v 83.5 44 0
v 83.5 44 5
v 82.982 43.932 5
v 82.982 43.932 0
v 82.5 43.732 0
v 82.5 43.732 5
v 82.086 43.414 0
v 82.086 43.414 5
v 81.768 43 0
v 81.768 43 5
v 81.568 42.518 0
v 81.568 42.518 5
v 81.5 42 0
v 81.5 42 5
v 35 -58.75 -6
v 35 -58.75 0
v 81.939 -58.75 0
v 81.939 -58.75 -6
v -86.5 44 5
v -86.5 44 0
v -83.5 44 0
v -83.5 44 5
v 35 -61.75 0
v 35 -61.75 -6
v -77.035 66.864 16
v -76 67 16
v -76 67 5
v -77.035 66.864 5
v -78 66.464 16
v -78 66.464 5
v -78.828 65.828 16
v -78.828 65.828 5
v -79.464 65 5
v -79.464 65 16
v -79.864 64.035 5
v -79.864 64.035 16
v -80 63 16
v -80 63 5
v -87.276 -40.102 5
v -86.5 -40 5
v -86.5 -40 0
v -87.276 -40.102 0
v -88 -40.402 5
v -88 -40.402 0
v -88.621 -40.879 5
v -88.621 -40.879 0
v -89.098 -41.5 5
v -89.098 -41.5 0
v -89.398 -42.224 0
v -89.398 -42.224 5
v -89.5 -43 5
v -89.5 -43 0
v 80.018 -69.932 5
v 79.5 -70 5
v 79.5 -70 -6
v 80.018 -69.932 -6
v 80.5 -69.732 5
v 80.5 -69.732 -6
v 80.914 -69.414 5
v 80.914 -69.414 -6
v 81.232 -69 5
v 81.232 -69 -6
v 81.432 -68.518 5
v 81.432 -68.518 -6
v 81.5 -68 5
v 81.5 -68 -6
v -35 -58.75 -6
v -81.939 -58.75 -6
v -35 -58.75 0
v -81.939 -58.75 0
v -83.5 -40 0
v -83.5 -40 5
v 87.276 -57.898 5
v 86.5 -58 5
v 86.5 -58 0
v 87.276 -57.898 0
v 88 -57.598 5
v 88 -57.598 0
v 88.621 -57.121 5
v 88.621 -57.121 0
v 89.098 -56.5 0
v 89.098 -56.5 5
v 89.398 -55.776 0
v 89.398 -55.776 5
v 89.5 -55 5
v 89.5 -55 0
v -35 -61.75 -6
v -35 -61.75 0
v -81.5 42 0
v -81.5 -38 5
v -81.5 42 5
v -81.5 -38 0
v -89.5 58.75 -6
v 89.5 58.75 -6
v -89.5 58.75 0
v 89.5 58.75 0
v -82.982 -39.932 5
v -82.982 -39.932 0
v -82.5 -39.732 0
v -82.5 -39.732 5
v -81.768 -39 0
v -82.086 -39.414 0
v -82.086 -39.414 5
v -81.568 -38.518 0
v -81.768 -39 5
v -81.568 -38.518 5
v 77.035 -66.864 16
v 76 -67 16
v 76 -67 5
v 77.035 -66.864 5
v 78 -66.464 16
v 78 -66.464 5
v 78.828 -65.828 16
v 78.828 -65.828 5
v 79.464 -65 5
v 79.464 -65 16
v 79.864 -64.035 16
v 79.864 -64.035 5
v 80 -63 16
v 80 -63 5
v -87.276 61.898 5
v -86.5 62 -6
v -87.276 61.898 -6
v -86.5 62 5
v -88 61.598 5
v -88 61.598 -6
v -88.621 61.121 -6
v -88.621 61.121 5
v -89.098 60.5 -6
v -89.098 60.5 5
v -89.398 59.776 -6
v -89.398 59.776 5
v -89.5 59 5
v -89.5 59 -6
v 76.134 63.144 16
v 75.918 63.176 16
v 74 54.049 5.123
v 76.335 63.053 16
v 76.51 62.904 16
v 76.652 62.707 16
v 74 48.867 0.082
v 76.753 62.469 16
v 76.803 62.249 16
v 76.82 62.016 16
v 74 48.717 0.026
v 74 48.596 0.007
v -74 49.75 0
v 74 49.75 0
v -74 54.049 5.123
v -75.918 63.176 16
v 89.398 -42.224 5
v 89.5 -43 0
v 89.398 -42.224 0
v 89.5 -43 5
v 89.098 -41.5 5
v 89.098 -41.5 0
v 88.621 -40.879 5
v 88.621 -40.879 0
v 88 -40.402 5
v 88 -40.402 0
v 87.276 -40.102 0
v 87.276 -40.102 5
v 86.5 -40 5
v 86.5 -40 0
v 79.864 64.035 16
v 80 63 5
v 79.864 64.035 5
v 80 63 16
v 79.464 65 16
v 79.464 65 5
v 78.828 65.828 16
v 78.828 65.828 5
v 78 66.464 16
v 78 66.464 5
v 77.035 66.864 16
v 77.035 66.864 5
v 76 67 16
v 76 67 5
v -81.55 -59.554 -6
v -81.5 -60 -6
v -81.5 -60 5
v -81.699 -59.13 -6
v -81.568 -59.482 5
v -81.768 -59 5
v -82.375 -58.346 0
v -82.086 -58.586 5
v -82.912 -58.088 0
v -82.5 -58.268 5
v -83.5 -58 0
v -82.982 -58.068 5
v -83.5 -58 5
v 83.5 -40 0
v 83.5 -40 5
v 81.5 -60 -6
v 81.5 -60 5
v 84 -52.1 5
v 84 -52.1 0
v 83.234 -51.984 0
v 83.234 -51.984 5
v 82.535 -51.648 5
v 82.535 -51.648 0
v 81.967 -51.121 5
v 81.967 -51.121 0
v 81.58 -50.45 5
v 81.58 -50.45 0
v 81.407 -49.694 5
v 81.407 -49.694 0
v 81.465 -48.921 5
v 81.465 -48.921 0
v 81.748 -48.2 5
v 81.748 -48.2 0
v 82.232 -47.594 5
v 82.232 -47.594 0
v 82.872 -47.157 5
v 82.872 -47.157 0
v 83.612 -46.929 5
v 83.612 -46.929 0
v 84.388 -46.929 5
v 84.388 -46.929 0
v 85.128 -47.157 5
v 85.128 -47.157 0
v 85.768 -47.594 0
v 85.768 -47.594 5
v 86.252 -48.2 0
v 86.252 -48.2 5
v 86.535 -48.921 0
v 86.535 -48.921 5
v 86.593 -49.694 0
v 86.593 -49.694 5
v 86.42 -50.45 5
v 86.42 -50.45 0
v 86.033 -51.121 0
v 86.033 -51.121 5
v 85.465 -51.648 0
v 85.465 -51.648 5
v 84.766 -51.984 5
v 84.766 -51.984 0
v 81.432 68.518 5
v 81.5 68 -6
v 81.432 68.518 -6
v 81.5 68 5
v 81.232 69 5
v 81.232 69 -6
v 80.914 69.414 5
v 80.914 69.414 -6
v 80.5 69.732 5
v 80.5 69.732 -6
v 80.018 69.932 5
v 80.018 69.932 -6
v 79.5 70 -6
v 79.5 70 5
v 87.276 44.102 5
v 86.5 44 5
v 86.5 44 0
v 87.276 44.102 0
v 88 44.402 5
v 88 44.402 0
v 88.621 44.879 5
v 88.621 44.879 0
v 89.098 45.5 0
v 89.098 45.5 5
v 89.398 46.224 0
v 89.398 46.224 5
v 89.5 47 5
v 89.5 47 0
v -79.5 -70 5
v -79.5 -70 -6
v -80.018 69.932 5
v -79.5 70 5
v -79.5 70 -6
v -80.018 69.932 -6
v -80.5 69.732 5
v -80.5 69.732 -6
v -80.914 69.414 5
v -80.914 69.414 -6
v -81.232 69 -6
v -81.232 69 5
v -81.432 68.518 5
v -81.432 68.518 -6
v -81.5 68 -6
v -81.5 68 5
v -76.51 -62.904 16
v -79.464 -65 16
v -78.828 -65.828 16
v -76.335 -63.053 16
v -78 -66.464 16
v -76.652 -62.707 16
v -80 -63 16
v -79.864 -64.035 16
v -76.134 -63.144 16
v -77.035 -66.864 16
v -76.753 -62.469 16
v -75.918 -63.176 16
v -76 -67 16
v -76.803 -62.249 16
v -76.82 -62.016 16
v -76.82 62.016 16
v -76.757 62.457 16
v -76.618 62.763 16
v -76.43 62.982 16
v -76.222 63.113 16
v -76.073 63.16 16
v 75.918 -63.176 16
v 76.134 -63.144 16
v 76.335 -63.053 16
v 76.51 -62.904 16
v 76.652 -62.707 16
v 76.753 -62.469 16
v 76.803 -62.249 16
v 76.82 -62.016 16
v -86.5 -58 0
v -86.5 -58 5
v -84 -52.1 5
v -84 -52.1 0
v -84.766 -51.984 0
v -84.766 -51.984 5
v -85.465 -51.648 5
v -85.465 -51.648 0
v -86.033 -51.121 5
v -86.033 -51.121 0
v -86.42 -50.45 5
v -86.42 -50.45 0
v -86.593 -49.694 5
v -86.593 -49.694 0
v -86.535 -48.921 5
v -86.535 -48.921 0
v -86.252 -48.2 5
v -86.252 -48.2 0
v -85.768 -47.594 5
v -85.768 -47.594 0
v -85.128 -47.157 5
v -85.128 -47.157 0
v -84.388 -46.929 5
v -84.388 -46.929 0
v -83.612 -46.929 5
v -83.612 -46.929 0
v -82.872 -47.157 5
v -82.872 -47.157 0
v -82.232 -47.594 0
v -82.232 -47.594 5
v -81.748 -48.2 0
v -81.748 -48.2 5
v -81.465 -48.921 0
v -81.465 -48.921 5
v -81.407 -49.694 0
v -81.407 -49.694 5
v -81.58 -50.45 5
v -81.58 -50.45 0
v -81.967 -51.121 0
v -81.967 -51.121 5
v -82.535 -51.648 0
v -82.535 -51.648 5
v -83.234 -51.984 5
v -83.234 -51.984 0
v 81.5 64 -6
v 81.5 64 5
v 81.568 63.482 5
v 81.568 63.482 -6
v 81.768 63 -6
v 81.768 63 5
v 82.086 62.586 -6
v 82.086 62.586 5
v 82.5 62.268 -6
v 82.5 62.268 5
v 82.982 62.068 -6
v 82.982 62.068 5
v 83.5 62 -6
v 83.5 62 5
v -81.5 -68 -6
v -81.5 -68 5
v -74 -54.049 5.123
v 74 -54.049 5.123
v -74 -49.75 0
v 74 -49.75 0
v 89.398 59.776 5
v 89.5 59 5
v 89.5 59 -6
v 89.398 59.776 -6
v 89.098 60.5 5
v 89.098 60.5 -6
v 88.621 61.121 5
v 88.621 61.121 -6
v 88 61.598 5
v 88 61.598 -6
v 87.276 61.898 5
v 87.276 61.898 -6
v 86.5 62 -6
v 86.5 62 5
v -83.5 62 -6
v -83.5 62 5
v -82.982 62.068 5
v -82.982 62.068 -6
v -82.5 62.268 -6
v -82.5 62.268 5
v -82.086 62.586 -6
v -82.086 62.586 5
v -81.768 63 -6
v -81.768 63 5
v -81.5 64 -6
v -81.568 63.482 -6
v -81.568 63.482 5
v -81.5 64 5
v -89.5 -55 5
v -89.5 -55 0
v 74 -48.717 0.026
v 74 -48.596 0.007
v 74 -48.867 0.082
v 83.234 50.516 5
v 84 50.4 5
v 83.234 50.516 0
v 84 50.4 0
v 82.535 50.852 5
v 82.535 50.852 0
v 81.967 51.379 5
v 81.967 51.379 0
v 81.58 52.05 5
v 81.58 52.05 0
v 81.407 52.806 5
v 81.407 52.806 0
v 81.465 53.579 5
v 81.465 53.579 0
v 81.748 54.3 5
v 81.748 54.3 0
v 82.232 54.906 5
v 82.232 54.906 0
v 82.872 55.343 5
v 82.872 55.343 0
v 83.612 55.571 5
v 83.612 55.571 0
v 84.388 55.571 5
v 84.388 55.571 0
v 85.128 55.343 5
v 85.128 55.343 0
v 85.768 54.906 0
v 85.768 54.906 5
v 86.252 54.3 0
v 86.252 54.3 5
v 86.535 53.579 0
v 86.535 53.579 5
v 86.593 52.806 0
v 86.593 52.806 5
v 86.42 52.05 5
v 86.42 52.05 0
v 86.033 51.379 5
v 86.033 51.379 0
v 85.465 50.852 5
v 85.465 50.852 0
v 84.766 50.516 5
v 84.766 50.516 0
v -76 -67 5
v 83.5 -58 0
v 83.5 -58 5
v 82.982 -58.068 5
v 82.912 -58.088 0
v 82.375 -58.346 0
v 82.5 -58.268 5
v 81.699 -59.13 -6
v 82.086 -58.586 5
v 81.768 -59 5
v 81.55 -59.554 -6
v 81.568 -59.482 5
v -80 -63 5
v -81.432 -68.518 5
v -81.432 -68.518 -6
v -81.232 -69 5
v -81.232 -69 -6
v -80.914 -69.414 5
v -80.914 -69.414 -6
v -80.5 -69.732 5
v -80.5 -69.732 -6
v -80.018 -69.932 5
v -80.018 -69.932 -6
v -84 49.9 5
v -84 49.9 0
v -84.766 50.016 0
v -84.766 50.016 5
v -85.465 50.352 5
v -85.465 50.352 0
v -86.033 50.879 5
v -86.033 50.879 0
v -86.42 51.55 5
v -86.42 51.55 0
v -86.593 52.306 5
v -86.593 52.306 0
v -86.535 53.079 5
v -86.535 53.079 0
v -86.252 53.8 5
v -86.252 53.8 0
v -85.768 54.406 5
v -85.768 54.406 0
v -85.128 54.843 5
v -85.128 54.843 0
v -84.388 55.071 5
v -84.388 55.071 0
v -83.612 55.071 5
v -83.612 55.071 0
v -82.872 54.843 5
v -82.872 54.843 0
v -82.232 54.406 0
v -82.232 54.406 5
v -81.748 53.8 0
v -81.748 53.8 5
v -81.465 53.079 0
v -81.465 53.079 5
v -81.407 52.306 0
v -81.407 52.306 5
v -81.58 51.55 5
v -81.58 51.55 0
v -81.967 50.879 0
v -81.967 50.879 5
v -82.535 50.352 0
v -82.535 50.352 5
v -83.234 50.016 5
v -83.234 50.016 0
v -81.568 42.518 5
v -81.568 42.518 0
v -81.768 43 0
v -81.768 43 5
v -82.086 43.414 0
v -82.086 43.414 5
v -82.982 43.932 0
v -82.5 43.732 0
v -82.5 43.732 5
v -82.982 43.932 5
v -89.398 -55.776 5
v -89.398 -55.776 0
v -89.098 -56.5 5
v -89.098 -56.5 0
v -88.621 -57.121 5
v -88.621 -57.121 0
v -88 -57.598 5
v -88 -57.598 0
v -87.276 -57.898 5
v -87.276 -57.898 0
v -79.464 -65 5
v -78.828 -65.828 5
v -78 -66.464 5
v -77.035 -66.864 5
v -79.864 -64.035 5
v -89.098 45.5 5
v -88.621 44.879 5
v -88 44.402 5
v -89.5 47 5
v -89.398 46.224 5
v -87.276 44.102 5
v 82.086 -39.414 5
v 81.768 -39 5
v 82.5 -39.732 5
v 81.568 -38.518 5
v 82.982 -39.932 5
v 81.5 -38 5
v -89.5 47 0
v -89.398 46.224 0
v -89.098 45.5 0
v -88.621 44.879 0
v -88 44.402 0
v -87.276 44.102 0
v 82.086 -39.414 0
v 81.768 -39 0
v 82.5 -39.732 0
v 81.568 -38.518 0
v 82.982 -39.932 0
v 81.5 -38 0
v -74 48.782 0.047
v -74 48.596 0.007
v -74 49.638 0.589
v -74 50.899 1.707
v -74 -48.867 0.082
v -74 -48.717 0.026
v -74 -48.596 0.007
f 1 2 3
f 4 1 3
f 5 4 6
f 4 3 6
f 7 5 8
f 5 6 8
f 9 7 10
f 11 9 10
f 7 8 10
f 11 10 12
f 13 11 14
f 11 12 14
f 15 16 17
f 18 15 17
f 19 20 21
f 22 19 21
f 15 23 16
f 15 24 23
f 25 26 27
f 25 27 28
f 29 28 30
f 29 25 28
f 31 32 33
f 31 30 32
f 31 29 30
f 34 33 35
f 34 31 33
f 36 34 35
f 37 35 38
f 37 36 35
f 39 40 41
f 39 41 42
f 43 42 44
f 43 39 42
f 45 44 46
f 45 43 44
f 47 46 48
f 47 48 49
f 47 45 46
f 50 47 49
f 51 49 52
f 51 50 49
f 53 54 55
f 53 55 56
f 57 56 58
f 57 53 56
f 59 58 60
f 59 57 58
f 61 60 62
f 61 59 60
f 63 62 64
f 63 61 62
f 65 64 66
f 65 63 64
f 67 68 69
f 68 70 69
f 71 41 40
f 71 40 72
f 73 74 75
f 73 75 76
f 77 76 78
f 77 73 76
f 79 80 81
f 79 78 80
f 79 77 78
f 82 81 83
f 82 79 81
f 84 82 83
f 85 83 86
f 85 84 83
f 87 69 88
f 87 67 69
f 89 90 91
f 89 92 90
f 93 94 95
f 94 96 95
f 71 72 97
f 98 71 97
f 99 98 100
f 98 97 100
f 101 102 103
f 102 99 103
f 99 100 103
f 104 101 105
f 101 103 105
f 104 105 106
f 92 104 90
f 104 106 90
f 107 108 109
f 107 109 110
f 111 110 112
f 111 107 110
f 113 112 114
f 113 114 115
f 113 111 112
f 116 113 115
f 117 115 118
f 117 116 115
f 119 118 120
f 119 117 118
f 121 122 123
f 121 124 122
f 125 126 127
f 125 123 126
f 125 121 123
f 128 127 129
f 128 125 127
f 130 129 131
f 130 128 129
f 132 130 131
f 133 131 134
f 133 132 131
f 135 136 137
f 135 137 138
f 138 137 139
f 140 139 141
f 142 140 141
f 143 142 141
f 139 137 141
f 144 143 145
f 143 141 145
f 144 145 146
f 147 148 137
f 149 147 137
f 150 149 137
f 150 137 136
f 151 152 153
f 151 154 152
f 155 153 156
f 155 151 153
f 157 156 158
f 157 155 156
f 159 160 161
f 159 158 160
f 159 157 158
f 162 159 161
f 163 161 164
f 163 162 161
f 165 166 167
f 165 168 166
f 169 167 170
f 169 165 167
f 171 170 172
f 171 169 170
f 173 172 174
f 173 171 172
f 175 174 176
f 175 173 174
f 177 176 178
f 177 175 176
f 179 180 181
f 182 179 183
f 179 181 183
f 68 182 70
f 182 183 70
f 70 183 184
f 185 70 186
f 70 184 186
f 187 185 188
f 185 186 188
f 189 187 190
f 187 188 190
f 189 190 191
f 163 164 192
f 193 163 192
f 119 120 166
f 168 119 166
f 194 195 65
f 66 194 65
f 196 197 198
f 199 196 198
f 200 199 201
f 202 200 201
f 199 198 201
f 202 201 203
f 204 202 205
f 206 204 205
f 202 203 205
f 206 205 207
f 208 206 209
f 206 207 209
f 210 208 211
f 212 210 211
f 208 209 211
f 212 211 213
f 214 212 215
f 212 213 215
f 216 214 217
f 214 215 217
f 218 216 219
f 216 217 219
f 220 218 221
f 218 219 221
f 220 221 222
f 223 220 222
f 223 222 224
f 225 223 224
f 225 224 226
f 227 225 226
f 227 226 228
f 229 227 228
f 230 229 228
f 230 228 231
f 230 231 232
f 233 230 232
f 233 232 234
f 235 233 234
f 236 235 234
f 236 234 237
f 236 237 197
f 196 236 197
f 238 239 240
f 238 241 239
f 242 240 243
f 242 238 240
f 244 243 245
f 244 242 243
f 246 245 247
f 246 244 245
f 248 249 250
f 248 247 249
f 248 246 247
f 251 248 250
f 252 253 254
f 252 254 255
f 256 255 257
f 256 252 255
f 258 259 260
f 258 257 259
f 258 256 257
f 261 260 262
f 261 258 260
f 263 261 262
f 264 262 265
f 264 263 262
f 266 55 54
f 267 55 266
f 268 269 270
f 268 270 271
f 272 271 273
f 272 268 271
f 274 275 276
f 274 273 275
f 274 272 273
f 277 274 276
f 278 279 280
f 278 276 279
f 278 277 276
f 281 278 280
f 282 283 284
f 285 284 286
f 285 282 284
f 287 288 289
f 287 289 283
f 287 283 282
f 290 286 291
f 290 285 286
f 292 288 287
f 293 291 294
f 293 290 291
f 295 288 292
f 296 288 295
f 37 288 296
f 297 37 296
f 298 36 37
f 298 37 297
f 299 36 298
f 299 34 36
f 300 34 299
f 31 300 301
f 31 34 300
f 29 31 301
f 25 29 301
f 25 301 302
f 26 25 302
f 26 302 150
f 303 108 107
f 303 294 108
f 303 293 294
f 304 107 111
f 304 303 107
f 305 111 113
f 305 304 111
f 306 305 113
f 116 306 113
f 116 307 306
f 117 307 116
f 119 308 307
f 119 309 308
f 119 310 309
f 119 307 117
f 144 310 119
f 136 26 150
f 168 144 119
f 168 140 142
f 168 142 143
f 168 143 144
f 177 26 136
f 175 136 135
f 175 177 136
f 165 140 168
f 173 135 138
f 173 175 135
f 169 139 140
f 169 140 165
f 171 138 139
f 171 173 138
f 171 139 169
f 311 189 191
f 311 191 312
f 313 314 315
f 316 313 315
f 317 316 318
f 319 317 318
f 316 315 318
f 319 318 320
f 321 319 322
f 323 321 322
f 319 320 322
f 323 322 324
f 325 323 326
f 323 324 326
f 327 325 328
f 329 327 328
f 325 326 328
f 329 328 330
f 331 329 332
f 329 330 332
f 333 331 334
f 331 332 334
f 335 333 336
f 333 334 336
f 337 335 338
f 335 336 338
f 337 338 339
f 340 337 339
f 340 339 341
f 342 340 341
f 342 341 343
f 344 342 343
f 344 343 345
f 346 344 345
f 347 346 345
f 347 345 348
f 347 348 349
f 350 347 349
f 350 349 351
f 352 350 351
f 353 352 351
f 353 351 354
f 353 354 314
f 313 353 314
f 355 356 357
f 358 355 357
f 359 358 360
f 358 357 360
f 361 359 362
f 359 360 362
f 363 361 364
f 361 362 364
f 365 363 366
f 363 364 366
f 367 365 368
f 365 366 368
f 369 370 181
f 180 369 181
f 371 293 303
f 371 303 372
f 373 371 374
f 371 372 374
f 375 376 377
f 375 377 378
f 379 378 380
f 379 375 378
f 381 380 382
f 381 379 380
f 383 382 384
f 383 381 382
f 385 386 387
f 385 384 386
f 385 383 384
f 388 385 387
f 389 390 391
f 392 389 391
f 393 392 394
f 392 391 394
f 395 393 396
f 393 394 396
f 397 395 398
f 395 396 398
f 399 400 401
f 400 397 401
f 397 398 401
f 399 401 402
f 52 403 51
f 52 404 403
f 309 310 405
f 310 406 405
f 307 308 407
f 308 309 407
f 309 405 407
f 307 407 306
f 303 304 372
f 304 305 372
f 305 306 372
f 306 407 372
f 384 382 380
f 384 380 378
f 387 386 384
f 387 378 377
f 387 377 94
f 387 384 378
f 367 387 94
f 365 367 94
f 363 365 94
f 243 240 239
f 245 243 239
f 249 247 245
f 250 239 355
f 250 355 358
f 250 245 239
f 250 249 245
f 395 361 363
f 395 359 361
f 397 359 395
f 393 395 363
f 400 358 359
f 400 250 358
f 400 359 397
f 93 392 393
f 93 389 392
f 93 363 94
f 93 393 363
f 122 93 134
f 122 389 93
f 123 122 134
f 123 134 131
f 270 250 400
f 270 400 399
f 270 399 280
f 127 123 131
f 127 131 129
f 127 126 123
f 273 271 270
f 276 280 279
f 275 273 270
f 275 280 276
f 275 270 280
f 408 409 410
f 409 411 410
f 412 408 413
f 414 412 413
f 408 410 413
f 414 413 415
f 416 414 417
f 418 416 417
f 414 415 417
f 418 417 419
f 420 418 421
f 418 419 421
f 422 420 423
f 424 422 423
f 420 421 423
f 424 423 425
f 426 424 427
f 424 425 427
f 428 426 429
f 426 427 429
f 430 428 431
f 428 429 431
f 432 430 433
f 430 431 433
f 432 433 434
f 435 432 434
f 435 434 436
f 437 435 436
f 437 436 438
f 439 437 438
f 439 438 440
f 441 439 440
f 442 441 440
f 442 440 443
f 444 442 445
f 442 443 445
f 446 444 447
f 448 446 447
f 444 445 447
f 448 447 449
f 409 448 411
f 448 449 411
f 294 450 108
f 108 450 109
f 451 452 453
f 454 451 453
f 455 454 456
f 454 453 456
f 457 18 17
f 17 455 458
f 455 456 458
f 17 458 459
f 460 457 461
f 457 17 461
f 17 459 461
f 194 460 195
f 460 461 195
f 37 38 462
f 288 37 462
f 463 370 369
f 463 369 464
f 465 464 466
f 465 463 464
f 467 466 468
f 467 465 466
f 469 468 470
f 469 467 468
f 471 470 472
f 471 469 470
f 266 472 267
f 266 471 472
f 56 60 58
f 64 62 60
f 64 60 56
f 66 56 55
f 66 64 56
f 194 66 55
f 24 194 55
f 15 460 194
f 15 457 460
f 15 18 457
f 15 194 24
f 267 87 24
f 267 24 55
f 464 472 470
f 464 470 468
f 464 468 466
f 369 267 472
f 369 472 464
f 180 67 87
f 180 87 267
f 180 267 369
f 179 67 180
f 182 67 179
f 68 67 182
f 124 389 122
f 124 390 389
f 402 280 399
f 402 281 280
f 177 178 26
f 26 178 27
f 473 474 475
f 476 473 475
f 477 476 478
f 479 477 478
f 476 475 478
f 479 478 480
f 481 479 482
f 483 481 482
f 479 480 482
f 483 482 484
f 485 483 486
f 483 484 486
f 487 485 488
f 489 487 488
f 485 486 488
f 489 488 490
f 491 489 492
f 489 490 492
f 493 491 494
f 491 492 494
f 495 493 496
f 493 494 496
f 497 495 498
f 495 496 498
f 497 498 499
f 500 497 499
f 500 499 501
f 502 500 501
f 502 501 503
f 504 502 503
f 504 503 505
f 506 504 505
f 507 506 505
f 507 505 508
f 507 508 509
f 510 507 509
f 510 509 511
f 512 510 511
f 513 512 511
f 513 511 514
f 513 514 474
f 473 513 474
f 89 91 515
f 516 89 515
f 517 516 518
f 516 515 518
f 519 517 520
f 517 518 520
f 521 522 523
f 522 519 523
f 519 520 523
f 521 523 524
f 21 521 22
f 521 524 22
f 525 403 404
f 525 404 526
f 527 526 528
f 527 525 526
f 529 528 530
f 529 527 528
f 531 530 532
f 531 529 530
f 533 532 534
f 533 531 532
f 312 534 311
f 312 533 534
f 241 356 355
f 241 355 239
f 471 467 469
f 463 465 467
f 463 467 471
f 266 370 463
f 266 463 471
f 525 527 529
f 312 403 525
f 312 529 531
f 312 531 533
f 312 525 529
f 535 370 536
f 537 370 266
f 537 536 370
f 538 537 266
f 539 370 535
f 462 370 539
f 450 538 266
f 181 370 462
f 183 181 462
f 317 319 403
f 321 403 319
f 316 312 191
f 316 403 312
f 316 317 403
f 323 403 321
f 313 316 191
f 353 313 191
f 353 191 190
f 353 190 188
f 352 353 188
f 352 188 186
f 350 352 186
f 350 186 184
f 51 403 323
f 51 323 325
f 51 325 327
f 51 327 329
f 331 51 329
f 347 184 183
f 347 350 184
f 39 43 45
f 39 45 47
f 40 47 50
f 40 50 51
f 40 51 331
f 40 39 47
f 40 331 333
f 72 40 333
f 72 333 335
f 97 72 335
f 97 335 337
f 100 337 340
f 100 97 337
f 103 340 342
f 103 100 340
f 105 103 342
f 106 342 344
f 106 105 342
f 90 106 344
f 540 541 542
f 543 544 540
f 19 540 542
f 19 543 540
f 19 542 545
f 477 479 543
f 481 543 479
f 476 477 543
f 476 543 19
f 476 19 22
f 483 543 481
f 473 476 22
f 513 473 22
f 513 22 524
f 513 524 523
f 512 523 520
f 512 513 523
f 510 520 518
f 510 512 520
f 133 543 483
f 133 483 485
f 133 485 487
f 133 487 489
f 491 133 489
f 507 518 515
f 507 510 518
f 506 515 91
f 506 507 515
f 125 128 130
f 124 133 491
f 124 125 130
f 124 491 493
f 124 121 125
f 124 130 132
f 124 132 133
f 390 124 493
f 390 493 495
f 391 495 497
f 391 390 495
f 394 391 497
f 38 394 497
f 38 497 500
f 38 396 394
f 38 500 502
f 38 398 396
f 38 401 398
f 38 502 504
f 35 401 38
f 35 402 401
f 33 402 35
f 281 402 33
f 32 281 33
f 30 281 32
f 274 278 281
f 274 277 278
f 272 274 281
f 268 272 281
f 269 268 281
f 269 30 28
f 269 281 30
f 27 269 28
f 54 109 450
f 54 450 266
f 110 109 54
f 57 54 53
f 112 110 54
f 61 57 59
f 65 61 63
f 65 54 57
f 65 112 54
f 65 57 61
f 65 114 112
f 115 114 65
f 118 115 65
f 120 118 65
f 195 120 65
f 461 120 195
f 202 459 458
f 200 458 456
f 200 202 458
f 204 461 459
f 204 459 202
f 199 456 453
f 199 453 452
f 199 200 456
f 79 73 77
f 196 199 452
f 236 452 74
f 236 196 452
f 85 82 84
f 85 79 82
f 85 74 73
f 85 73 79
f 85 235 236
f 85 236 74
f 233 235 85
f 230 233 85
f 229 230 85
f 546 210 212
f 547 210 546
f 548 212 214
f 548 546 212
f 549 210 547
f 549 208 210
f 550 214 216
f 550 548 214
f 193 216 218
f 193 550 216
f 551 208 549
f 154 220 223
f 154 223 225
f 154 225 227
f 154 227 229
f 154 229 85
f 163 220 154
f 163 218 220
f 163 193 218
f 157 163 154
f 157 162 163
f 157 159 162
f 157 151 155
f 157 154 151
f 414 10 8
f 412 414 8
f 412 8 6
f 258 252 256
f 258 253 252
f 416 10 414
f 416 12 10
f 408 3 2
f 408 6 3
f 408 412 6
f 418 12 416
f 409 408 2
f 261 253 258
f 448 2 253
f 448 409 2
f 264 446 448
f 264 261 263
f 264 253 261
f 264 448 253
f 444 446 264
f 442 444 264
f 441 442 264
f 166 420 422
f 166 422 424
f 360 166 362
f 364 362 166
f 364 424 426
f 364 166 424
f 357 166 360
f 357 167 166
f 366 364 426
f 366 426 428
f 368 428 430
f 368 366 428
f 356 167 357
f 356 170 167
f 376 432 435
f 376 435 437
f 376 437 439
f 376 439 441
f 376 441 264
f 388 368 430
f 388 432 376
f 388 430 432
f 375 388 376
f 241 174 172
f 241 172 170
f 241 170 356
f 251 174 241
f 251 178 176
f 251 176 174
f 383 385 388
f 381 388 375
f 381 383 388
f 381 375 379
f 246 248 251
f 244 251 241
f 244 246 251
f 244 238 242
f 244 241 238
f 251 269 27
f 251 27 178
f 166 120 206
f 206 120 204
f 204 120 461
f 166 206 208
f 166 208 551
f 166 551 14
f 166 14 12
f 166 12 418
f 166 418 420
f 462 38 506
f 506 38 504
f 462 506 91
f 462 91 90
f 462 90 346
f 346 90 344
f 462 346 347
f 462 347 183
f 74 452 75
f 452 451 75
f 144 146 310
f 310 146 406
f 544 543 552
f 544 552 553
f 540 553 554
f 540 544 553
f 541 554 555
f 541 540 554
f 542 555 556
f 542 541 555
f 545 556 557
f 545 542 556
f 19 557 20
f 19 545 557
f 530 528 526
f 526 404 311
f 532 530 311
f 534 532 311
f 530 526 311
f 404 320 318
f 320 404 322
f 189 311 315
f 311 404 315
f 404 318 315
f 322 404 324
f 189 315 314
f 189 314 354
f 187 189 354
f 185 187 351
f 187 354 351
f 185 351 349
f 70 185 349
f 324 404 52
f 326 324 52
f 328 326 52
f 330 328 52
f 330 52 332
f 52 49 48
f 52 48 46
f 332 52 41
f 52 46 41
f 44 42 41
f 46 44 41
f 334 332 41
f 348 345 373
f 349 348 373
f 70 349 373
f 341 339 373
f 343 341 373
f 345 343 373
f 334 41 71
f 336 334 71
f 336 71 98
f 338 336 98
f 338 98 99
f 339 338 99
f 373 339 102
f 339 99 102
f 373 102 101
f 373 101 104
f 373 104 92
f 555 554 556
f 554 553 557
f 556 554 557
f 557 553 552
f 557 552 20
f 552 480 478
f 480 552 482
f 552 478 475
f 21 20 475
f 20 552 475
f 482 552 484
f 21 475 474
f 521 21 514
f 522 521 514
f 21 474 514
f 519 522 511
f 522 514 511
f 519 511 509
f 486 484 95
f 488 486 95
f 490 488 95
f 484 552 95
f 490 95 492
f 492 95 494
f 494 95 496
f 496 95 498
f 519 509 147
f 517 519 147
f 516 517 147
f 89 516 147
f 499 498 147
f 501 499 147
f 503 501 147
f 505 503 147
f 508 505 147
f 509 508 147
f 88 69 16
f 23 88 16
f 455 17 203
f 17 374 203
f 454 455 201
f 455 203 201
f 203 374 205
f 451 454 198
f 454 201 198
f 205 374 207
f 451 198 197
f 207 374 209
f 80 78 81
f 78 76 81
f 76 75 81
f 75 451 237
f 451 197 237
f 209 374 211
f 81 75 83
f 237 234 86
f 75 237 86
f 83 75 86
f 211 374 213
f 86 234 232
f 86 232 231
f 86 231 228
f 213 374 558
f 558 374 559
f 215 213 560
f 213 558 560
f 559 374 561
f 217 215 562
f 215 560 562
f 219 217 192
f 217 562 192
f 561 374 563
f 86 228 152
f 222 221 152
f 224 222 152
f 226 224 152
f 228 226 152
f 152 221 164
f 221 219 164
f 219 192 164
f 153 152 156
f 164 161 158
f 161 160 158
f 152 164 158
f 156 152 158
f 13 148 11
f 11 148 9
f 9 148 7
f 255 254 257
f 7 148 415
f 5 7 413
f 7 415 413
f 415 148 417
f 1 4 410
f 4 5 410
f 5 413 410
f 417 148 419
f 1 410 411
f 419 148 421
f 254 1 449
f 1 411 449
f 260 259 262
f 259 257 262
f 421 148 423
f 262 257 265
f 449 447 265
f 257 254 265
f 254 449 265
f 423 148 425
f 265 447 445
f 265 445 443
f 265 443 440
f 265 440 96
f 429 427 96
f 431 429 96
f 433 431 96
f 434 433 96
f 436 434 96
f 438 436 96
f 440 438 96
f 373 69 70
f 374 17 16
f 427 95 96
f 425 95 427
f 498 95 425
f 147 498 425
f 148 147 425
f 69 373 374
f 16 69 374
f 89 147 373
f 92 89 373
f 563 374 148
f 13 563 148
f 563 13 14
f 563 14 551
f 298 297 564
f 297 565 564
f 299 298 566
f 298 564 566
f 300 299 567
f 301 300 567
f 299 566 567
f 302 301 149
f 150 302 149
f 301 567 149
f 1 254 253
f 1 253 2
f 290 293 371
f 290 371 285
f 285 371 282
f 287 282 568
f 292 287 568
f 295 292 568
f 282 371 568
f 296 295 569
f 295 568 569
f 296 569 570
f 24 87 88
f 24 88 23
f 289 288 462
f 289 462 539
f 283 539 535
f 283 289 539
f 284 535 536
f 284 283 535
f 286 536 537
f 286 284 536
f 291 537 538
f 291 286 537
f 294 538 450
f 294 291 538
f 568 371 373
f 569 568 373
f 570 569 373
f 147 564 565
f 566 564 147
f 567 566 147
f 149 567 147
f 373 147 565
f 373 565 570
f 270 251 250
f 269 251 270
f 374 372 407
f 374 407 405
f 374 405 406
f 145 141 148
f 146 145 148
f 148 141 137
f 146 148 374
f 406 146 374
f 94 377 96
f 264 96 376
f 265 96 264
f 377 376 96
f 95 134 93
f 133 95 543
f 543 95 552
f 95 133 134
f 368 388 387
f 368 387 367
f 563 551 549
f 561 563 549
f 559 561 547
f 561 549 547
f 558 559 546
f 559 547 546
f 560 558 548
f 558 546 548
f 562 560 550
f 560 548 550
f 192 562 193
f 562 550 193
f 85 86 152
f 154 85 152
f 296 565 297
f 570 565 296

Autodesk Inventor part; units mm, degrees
ref_plane "YZ Plane" through (0, 0, 0) normal (1, 0, 0) x (0, 1, 0)
ref_plane "XZ Plane" through (0, 0, 0) normal (0, 1, 0) x (-1, 0, 0)
ref_plane "XY Plane" through (0, 0, 0) normal (0, 0, 1) x (1, 0, 0)
sketch "Sketch1" plane through (0, 0, 0) normal (0, 0, 1) x (1, 0, 0)
  line L0 (-81.5, 70) -> (81.5, 70)
  line L1 (81.5, 70) -> (81.5, -70)
  line L2 (81.5, -70) -> (-81.5, -70)
  line L3 (-81.5, -70) -> (-81.5, 70)
  line L4 (-81.5, 70) -> (81.5, -70) construction
  line L5 (81.5, 70) -> (-81.5, -70) construction
  line L6 (81.5, 62) -> (89.5, 62)
  line L7 (89.5, 62) -> (89.5, 44)
  line L8 (89.5, 44) -> (81.5, 44)
  line L9 (81.5, 44) -> (81.5, 62)
  line L10 (81.5, -58) -> (89.5, -58)
  line L11 (89.5, -58) -> (89.5, -40)
  line L12 (89.5, -40) -> (81.5, -40)
  line L13 (81.5, -40) -> (81.5, -58)
  line L14 (-81.5, 62) -> (-89.5, 62)
  line L15 (-89.5, 62) -> (-89.5, 44)
  line L16 (-89.5, 44) -> (-81.5, 44)
  line L17 (-81.5, 44) -> (-81.5, 62)
  line L18 (-81.5, -58) -> (-89.5, -58)
  line L19 (-89.5, -58) -> (-89.5, -40)
  line L20 (-89.5, -40) -> (-81.5, -40)
  line L21 (-81.5, -40) -> (-81.5, -58)
  point P0 (0, 0)
  dimension "d0" = 163
  dimension "d1" = 140
  dimension "d2" = 8
  dimension "d3" = 18
  dimension "d4" = 8
  dimension "d5" = 12
extrude "Extrusion1" add sketch "Sketch1" along normal blind 5
sketch "Sketch2" plane through (0, 0, 5) normal (0, 0, 1) x (1, 0, 0)
  line L0 (-80, -67) -> (80, -67)
  line L1 (80, -67) -> (80, 67)
  line L2 (80, 67) -> (-80, 67)
  line L3 (-80, 67) -> (-80, -67)
  line L4 (-80, -67) -> (80, 67) construction
  line L5 (80, -67) -> (-80, 67) construction
  line L6 (81.5, 70) -> (-81.5, 70) projected
  line L7 (81.5, -40) -> (81.5, 44) projected
  point P0 (0, 0)
  dimension "d48" = 160
  dimension "d49" = 134
extrude "Extrusion2" add sketch "Sketch2" along normal blind 11
sketch "Sketch3" plane through (0, 0, 0) normal (1, 0, 0) x (0, 1, 0)
  line L0 (49.75, 0) -> (-49.75, 0)
  line L1 (49.75, 0) -> (66.532, 20)
  line L2 (66.532, 20) -> (-66.532, 20)
  line L3 (-66.532, 20) -> (-49.75, 0)
  point P0 (0, 0)
  point P1 (0, 0)
  dimension "d12" = 99.5
  dimension "d13" = 20
  dimension "d14" = 130
  dimension "d15" = 130
extrude "Extrusion3" cut sketch "Sketch3" against normal mid plane 148
chamfer "Chamfer1" distance 2.82 angle 80 1 edges at (74, 0, 16) measured on face at (78, -21.0585, 16)
chamfer "Chamfer2" distance 2.82 angle 80 1 edges at (-74, 0, 16) measured on face at (-78, 21.0585, 16)
fillet "Fillet1" radius 4 4 edges at (-80, 67, 10.5) (-80, -67, 10.5) (80, 67, 10.5) (80, -67, 10.5)
fillet "Fillet3" radius 1 4 edges at (-75.41, -56.4657, 8.0035) (75.41, -56.4657, 8.0035) (75.41, 56.4657, 8.0035) (-75.41, 56.4657, 8.0035)
fillet "Fillet4" radius 3 8 edges at (89.5, 62, 2.5) (89.5, -40, 2.5) (89.5, -58, 2.5) (89.5, 44, 2.5) (-89.5, 62, 2.5) (-89.5, 44, 2.5) (-89.5, -40, 2.5) (-89.5, -58, 2.5)
fillet "Fillet5" radius 2 12 edges at (-81.5, 70, 2.5) (81.5, 70, 2.5) (-81.5, -70, 2.5) (81.5, -70, 2.5) (-81.5, -58, 2.5) (-81.5, 44, 2.5) (81.5, -40, 2.5) (81.5, -58, 2.5) (81.5, 62, 2.5) (-81.5, 62, 2.5) (-81.5, -40, 2.5) (81.5, 44, 2.5)
sketch "Sketch4" plane through (0, 0, 5) normal (0, 0, 1) x (1, 0, 0)
  line L0 (-84, -50.9) -> (84, -50.9)
  line L1 (84, -50.9) -> (84, 50.9)
  line L2 (84, 50.9) -> (-84, 50.9)
  line L3 (-84, 50.9) -> (-84, -50.9)
  line L4 (-84, -50.9) -> (84, 50.9) construction
  line L5 (84, -50.9) -> (-84, 50.9) construction
  line L6 (-89.5, 59) -> (-89.5, 47) projected
  line L7 (89.5, 47) -> (89.5, 59) projected
  line L8 (89.5, -55) -> (89.5, -43) projected
  line L9 (-89.5, -43) -> (-89.5, -55) projected
  line L10 (76, 67) -> (-76, 67) projected
  point P0 (0, 0)
  point P1 (-84, 52.5)
  point P2 (84, 53)
  point P3 (84, -49.5)
  point P4 (-84, -49.5)
  point P5 (89.5, 53)
  dimension "d30" = 168
  dimension "d38" = 102
  dimension "d39" = 101.8
  dimension "d50" = 14.5
hole "Hole1" at (-84, 52.5, 5) at (84, 53, 5) at (84, -49.5, 5) at (-84, -49.5, 5) direction (0, 0, -1) diameter 5.2 end through all
sketch "Sketch5" plane through (0, 0, 0) normal (0, 0, -1) x (-1, 0, 0)
  line L0 (-96.4, 58.75) -> (96.4, 58.75)
  line L1 (96.4, 58.75) -> (96.4, -58.75)
  line L2 (96.4, -58.75) -> (-96.4, -58.75)
  line L3 (-96.4, -58.75) -> (-96.4, 58.75)
  line L4 (-96.4, 58.75) -> (96.4, -58.75) construction
  line L5 (96.4, 58.75) -> (-96.4, -58.75) construction
  circle A0 centre (-84, -49.5) radius 2.6 projected
  circle A1 centre (84, 52.5) radius 2.6 projected
  circle A2 centre (-84, 53) radius 2.6 projected
  circle A3 centre (84, -49.5) radius 2.6 projected
  line L6 (-74, -49.75) -> (-74, 49.75) projected
  line L7 (-74, 49.75) -> (74, 49.75) projected
  line L8 (74, 49.75) -> (74, -49.75) projected
  line L9 (74, -49.75) -> (-74, -49.75) projected
  arc A4 (-81.5, -68) -> (-79.5, -70) centre (-79.5, -68) ccw projected
  line L10 (79.5, -70) -> (-79.5, -70) projected
  arc A5 (79.5, -70) -> (81.5, -68) centre (79.5, -68) ccw projected
  line L11 (81.5, -60) -> (81.5, -68) projected
  arc A6 (83.5, -58) -> (81.5, -60) centre (83.5, -60) ccw projected
  line L12 (86.5, -58) -> (83.5, -58) projected
  arc A7 (86.5, -58) -> (89.5, -55) centre (86.5, -55) ccw projected
  line L13 (89.5, -43) -> (89.5, -55) projected
  arc A8 (89.5, -43) -> (86.5, -40) centre (86.5, -43) ccw projected
  line L14 (83.5, -40) -> (86.5, -40) projected
  arc A9 (81.5, -38) -> (83.5, -40) centre (83.5, -38) ccw projected
  line L15 (81.5, 42) -> (81.5, -38) projected
  arc A10 (83.5, 44) -> (81.5, 42) centre (83.5, 42) ccw projected
  line L16 (86.5, 44) -> (83.5, 44) projected
  arc A11 (86.5, 44) -> (89.5, 47) centre (86.5, 47) ccw projected
  line L17 (89.5, 59) -> (89.5, 47) projected
  arc A12 (89.5, 59) -> (86.5, 62) centre (86.5, 59) ccw projected
  line L18 (83.5, 62) -> (86.5, 62) projected
  arc A13 (81.5, 64) -> (83.5, 62) centre (83.5, 64) ccw projected
  line L19 (81.5, 68) -> (81.5, 64) projected
  arc A14 (81.5, 68) -> (79.5, 70) centre (79.5, 68) ccw projected
  line L20 (-79.5, 70) -> (79.5, 70) projected
  arc A15 (-79.5, 70) -> (-81.5, 68) centre (-79.5, 68) ccw projected
  line L21 (-81.5, 64) -> (-81.5, 68) projected
  arc A16 (-83.5, 62) -> (-81.5, 64) centre (-83.5, 64) ccw projected
  line L22 (-86.5, 62) -> (-83.5, 62) projected
  arc A17 (-86.5, 62) -> (-89.5, 59) centre (-86.5, 59) ccw projected
  line L23 (-89.5, 47) -> (-89.5, 59) projected
  arc A18 (-89.5, 47) -> (-86.5, 44) centre (-86.5, 47) ccw projected
  line L24 (-83.5, 44) -> (-86.5, 44) projected
  arc A19 (-81.5, 42) -> (-83.5, 44) centre (-83.5, 42) ccw projected
  line L25 (-81.5, -38) -> (-81.5, 42) projected
  arc A20 (-83.5, -40) -> (-81.5, -38) centre (-83.5, -38) ccw projected
  line L26 (-86.5, -40) -> (-83.5, -40) projected
  arc A21 (-86.5, -40) -> (-89.5, -43) centre (-86.5, -43) ccw projected
  line L27 (-89.5, -55) -> (-89.5, -43) projected
  arc A22 (-89.5, -55) -> (-86.5, -58) centre (-86.5, -55) ccw projected
  line L28 (-83.5, -58) -> (-86.5, -58) projected
  arc A23 (-81.5, -60) -> (-83.5, -58) centre (-83.5, -60) ccw projected
  line L29 (-81.5, -68) -> (-81.5, -60) projected
  point P0 (0, 0)
  point P1 (89.458, -58.5)
  point P2 (-89.458, -58.5)
  point P3 (-89.5, 58.75)
  point P4 (89.5, 58.75)
  point P5 (81.9388, -58.75)
  point P6 (-81.9388, -58.75)
  dimension "d40" = 192.8
  dimension "d41" = 117.5
extrude "Extrusion4" add sketch "Sketch5" along normal blind 6 contours L23 A17 L22 A16 L21 A15 L20 A14 L19 A13 L18 A12 L17 L0 | L2 A6 L11 A5 L10 A4 L29 A23
sketch "Sketch6" plane through (0, 0, -6) normal (0, 0, -1) x (-1, 0, 0)
  line L0 (81.9388, -58.75) -> (-81.9388, -58.75) projected
  line L1 (-35, -58.75) -> (35, -58.75)
  line L2 (35, -58.75) -> (35, -61.75)
  line L3 (35, -61.75) -> (-35, -61.75)
  line L4 (-35, -61.75) -> (-35, -58.75)
  point P0 (0, 0)
  point P1 (89.458, -58.5)
  point P2 (-89.458, -58.5)
  point P3 (0, -58.75)
  point P4 (35, -58.5)
  dimension "d44" = 3
  dimension "d45" = 70
extrude "Extrusion5" cut sketch "Sketch6" against normal up to surface (6 mm away)
properties part number "DisplayBezel"
